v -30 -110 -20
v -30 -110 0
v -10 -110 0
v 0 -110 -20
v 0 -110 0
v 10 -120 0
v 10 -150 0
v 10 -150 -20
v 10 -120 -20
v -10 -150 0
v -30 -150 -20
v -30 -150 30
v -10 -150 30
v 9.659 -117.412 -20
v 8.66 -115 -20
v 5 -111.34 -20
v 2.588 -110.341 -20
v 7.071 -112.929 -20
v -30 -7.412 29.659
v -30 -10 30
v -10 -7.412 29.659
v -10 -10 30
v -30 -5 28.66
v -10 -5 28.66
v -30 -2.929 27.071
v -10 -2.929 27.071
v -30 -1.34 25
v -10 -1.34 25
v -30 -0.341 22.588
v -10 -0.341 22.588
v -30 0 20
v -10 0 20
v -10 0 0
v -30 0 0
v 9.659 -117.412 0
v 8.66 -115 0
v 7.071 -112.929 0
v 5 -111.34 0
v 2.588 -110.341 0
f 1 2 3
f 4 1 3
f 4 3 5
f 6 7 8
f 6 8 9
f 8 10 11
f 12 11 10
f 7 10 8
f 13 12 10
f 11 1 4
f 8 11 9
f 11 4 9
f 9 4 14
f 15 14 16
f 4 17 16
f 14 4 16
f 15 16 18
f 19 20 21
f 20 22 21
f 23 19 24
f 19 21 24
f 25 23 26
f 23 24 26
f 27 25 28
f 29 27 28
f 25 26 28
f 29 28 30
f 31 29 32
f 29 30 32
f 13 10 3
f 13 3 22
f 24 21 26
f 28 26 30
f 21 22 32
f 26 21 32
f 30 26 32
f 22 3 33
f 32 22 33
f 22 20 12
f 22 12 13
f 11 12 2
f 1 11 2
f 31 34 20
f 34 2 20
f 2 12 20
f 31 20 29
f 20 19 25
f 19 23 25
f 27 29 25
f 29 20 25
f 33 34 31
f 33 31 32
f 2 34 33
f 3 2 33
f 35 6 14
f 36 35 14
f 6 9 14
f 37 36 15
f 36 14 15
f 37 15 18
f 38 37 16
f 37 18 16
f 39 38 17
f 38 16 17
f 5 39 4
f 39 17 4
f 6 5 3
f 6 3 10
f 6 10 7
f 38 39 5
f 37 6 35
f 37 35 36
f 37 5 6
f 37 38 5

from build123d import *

# Parameters (mm, degrees)
SKETCH1_W           = 20
SKETCH1_H           = 150
BOSS_EXTRUDE1_DEPTH = 30
SKETCH2_W           = 40
SKETCH2_H           = 40
BOSS_EXTRUDE2_DEPTH = 20
FILLET1_R           = 10


with BuildPart() as part:
    # Sketch1 → Boss-Extrude1 (new body)
    with BuildSketch(Plane.XY):
        with Locations((-20, -75)):
            Rectangle(SKETCH1_W, SKETCH1_H)
    extrude(amount=BOSS_EXTRUDE1_DEPTH)

    # Sketch2 → Boss-Extrude2 (add)
    with BuildSketch(Plane.XY):
        with Locations((-10, -130)):
            Rectangle(SKETCH2_W, SKETCH2_H)
    extrude(amount=-BOSS_EXTRUDE2_DEPTH)

    # Fillet1
    fillet1_edges = [part.edges().sort_by_distance(p)[0] for p in [
        (10, -110, -10),
        (-20, 0, 30),
    ]]
    fillet(fillet1_edges, radius=FILLET1_R)


solid = part.part
